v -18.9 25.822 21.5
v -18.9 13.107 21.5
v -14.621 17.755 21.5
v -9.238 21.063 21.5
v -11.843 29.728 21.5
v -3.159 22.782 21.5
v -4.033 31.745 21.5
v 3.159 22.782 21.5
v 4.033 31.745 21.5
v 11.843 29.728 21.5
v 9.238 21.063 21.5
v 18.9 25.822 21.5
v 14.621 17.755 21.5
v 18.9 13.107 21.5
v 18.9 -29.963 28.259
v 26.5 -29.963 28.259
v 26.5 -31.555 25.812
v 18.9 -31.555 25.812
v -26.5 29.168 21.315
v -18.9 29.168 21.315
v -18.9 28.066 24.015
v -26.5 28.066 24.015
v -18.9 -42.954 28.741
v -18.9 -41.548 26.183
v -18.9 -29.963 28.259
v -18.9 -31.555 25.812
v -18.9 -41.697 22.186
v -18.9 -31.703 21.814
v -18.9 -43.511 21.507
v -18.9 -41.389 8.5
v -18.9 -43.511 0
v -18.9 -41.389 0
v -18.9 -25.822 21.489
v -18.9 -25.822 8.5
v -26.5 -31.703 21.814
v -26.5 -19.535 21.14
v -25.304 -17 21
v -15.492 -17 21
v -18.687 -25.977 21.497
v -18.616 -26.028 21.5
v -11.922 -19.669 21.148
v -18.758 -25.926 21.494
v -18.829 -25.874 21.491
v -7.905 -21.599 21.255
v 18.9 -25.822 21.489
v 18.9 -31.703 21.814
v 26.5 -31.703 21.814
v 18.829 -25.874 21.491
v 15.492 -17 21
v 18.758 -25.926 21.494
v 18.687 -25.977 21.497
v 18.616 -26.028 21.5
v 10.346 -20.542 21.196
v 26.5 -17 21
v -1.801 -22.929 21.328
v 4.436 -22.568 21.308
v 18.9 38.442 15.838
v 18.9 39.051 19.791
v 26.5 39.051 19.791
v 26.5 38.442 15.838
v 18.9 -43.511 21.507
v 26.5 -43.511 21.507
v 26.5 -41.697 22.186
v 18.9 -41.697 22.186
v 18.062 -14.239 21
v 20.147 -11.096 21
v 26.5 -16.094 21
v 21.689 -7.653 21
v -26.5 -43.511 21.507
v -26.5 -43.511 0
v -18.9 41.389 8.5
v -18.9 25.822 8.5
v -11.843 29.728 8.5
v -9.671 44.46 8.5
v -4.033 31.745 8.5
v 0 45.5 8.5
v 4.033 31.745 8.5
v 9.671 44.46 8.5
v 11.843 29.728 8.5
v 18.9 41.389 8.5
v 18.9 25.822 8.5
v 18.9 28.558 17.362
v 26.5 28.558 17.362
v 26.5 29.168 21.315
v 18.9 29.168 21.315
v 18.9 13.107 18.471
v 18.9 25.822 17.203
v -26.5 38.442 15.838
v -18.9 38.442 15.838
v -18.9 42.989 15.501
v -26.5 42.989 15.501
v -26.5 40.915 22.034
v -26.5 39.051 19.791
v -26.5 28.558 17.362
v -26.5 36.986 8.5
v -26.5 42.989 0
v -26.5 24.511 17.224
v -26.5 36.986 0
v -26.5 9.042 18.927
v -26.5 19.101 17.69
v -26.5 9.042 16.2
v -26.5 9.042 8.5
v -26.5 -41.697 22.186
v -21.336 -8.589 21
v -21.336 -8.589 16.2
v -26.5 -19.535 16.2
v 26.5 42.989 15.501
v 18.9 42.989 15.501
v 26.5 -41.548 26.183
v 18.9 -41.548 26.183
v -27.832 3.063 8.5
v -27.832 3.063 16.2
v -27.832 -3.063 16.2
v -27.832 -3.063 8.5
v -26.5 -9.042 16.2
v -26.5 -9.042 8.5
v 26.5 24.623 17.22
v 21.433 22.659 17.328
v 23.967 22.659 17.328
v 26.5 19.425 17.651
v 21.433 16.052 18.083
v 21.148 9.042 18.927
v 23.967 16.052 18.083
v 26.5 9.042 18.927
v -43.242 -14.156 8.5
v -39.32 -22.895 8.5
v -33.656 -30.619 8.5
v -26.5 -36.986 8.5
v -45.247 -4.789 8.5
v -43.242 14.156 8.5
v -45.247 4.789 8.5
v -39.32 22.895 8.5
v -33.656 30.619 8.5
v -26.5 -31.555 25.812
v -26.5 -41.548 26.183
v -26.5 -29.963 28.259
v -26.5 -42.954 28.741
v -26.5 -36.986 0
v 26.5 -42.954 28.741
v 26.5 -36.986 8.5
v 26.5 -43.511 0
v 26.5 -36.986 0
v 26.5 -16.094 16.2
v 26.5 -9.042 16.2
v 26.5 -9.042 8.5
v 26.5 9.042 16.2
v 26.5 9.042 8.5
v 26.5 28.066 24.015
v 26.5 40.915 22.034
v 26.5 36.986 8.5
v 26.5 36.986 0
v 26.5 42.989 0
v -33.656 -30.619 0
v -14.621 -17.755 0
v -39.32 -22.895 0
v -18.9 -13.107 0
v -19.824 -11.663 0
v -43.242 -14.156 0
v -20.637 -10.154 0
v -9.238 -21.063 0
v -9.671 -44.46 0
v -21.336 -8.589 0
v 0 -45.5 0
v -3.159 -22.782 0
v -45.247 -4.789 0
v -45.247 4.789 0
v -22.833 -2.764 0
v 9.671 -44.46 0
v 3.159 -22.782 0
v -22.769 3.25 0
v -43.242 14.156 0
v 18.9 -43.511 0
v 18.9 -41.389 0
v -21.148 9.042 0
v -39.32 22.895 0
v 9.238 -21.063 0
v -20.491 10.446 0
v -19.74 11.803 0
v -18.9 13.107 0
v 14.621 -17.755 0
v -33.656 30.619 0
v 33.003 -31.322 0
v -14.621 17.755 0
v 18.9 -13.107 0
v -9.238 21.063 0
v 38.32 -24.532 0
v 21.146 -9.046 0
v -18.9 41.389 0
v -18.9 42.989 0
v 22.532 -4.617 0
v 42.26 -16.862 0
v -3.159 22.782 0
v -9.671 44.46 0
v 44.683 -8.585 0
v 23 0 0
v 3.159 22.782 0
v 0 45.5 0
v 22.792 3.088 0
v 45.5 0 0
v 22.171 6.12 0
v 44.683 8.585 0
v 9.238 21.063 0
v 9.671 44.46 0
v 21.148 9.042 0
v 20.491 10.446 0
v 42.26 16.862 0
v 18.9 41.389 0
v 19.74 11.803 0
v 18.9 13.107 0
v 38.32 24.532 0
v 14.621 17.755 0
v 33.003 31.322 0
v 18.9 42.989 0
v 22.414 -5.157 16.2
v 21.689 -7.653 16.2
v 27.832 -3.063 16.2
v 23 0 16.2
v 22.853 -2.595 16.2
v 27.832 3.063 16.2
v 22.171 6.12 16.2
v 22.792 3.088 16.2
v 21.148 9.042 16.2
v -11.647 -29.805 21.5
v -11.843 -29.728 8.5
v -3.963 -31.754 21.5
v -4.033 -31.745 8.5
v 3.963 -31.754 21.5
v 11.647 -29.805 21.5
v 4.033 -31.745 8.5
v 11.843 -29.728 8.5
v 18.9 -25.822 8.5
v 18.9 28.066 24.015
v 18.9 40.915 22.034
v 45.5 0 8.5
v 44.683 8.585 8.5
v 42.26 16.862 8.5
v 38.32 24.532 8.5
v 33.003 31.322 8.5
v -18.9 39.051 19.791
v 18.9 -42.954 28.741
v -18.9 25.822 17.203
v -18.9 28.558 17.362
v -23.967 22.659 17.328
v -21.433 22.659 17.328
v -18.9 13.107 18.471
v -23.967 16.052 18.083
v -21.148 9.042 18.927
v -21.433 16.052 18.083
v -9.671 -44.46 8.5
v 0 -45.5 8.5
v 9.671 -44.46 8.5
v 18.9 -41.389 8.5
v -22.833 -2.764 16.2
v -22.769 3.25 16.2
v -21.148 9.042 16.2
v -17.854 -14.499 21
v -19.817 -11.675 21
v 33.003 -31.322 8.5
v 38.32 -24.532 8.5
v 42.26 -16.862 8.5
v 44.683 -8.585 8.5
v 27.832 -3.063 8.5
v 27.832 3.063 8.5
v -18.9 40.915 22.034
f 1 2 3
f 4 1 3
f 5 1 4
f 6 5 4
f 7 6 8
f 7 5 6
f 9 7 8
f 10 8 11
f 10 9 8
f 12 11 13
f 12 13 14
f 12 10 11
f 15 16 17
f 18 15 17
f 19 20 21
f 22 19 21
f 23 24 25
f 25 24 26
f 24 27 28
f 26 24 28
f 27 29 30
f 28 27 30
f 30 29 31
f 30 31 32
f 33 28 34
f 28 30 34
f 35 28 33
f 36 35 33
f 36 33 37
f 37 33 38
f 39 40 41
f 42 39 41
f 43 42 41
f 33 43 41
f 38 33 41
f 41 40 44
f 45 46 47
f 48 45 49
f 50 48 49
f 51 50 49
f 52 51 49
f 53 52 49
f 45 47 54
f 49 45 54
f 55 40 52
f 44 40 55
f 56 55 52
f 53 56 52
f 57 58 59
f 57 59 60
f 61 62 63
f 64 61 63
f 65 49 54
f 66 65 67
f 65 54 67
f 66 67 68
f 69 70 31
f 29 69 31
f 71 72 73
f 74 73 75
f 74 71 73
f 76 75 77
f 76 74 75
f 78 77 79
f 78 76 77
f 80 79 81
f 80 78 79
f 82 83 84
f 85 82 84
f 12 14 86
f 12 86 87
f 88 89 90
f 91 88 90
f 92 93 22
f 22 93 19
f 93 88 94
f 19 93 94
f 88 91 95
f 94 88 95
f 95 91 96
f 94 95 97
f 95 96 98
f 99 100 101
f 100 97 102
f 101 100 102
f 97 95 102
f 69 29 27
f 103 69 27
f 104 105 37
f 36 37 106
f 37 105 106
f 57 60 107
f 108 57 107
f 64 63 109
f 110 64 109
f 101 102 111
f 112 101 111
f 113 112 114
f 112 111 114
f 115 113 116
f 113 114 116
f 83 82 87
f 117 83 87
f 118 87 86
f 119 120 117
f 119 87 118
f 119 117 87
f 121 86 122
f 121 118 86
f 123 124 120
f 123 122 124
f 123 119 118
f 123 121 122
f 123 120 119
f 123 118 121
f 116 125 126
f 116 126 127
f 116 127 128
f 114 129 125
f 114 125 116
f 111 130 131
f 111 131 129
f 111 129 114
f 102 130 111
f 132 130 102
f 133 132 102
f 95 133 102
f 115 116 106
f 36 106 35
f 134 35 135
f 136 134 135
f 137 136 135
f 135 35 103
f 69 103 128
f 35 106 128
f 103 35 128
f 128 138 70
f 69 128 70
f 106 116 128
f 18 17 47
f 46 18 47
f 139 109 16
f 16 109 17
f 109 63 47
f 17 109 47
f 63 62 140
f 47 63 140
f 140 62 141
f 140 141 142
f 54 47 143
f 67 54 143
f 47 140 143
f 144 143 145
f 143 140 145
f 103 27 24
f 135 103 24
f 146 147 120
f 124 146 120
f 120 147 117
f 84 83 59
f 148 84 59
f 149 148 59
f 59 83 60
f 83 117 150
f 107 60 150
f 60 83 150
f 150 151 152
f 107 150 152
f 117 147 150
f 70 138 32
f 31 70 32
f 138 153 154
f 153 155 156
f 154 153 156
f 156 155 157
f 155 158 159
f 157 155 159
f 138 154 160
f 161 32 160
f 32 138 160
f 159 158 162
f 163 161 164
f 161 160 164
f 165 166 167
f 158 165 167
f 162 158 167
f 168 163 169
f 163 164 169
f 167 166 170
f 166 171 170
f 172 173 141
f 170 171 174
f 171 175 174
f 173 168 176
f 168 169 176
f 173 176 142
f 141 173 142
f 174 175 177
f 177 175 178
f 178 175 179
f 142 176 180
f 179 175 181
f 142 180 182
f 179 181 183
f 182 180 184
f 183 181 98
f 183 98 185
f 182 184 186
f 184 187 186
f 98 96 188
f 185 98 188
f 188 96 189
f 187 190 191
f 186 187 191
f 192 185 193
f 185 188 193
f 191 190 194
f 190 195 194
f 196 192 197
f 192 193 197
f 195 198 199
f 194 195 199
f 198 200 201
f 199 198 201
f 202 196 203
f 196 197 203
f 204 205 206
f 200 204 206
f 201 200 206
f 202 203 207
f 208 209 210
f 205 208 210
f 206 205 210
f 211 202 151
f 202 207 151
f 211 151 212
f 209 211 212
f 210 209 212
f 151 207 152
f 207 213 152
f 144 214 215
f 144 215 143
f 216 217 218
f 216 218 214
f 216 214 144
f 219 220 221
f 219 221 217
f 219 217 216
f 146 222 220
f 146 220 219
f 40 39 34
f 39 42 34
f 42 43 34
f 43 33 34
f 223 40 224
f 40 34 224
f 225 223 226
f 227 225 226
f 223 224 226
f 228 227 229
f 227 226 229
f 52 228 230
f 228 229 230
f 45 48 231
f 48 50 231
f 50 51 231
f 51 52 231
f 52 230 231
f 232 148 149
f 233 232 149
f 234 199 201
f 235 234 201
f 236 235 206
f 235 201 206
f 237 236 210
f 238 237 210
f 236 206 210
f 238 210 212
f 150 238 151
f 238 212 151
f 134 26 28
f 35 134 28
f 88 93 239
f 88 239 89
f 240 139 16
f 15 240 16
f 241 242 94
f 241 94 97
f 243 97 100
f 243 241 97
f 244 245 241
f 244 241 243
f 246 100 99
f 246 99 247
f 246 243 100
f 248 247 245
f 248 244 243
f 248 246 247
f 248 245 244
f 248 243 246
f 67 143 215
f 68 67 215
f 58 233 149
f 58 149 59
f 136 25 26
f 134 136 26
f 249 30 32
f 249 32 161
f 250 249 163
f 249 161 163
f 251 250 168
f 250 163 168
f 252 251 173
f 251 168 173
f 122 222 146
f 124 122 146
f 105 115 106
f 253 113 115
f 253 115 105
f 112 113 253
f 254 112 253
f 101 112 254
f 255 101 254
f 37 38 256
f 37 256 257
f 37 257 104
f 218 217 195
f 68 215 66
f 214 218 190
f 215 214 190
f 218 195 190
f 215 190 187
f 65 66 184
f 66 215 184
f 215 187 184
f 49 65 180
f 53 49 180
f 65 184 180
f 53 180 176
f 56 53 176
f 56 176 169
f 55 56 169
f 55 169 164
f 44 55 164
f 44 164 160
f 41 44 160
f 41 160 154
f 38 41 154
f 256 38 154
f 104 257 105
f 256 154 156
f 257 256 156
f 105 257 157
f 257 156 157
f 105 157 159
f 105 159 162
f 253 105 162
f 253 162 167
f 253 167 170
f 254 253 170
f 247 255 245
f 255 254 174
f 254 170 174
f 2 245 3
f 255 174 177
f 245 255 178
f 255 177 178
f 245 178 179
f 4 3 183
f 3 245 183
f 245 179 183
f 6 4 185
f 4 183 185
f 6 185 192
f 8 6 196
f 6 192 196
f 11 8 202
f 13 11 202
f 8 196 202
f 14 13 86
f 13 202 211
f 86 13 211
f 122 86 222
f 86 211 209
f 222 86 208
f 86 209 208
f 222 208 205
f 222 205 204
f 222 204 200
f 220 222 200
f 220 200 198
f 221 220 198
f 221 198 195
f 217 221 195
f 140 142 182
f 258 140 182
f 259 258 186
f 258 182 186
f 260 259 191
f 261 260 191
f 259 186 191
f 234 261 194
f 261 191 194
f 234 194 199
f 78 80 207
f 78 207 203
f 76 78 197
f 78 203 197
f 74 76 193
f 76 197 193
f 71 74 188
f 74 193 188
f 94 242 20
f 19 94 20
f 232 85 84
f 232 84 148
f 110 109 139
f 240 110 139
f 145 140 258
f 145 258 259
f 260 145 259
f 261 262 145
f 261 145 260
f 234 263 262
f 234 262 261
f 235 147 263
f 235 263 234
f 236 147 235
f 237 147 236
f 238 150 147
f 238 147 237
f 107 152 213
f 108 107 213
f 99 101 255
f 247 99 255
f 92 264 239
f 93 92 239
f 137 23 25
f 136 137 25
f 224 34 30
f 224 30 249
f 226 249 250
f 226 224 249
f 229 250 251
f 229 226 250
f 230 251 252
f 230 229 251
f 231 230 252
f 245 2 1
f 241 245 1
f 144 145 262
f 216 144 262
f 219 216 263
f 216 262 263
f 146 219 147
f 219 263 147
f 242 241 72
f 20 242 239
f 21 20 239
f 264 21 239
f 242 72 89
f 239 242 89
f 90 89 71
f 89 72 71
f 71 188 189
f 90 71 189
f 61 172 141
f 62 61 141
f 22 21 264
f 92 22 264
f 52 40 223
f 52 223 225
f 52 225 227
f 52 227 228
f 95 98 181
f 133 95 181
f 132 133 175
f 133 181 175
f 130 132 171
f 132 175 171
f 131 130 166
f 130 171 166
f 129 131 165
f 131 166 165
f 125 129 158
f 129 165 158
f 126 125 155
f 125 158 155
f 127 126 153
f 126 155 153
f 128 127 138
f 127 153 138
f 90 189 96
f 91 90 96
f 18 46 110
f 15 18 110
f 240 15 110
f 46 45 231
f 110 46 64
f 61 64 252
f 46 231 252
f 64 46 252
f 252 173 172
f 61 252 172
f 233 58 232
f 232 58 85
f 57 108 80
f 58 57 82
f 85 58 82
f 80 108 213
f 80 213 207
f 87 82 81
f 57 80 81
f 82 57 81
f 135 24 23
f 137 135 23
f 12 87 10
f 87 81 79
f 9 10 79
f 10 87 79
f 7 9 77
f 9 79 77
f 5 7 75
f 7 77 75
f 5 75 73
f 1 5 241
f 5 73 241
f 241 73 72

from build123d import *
from build123d import SkipClean  # not in build123d's __all__

# Parameters (mm, degrees)
F2_DEPTH = 8.5
F3_DEPTH = 29
F4_DEPTH = 16.2
F5_DEPTH = 21.5
F6_W     = 8.4938306999
F6_H     = 8
F7_DEPTH = 53
F8_DEPTH = 7.6
F9_START = -45.4
F9_DEPTH = 9.2


with BuildPart() as f2:
    # F0 (on Top) → F2 (new body)
    with BuildSketch(Plane.XY):
        with BuildLine():
            ThreePointArc((-26.5, -9.04157066), (-28, 0), (-26.5, 9.04157066))
            Line((-26.5, 9.04157066), (-26.5, 36.9864840178))
            ThreePointArc((-26.5, 36.9864840178), (-45.5, 0), (-26.5, -36.9864840178))
            Line((-26.5, -36.9864840178), (-26.5, -19.535109446))
            Line((-26.5, -19.535109446), (-26.5, -9.04157066))
        make_face()
        with BuildLine():
            Line((18.9, -41.3888873975), (18.9, -25.822277204))
            ThreePointArc((18.9, -25.822277204), (0, -32), (-18.9, -25.822277204))
            Line((-18.9, -25.822277204), (-18.9, -41.3888873975))
            ThreePointArc((-18.9, -41.3888873975), (0, -45.5), (18.9, -41.3888873975))
        make_face()
        with BuildLine():
            Line((26.5, 36.9864840178), (26.5, 9.04157066))
            ThreePointArc((26.5, 9.04157066), (28, 0), (26.5, -9.04157066))
            Line((26.5, -9.04157066), (26.5, -16.0938306999))
            Line((26.5, -16.0938306999), (26.5, -36.9864840178))
            ThreePointArc((26.5, -36.9864840178), (40.4722126897, -20.7906228863), (45.5, 0))
            ThreePointArc((45.5, 0), (40.4722126897, 20.7906228863), (26.5, 36.9864840178))
        make_face()
        with BuildLine():
            ThreePointArc((-18.9, 25.822277204), (0, 32), (18.9, 25.822277204))
            Line((18.9, 25.822277204), (18.9, 41.3888873975))
            ThreePointArc((18.9, 41.3888873975), (0, 45.5), (-18.9, 41.3888873975))
            Line((-18.9, 41.3888873975), (-18.9, 25.822277204))
        make_face()
        with BuildLine():
            Line((-18.9, -25.822277204), (-18.9, -13.1068684284))
            ThreePointArc((-18.9, -13.1068684284), (-20.2445385279, -10.915981852), (-21.3362014212, -8.588743151))
            Line((-21.3362014212, -8.588743151), (-26.5, -19.535109446))
            Line((-26.5, -19.535109446), (-26.5, -36.9864840178))
            ThreePointArc((-26.5, -36.9864840178), (-22.806474714, -39.3714961758), (-18.9, -41.3888873975))
            Line((-18.9, -41.3888873975), (-18.9, -25.822277204))
        make_face()
        with BuildLine():
            Line((18.9, -25.822277204), (18.9, -13.1068684284))
            ThreePointArc((18.9, -13.1068684284), (0, -23), (-18.9, -13.1068684284))
            Line((-18.9, -13.1068684284), (-18.9, -25.822277204))
            ThreePointArc((-18.9, -25.822277204), (0, -32), (18.9, -25.822277204))
        make_face()
        with BuildLine():
            Line((26.5, -16.0938306999), (21.6892735119, -7.6534576843))
            ThreePointArc((21.6892735119, -7.6534576843), (20.4769920458, -10.4734329022), (18.9, -13.1068684284))
            Line((18.9, -13.1068684284), (18.9, -25.822277204))
            Line((18.9, -25.822277204), (18.9, -41.3888873975))
            ThreePointArc((18.9, -41.3888873975), (22.806474714, -39.3714961758), (26.5, -36.9864840178))
            Line((26.5, -36.9864840178), (26.5, -16.0938306999))
        make_face()
        with BuildLine():
            ThreePointArc((21.1482859826, 9.04157066), (22.5323165431, 4.614619291), (23, 0))
            ThreePointArc((23, 0), (22.6699502731, -3.8824418364), (21.6892735119, -7.6534576843))
            Line((21.6892735119, -7.6534576843), (26.5, -16.0938306999))
            Line((26.5, -16.0938306999), (26.5, -9.04157066))
            ThreePointArc((26.5, -9.04157066), (28, 0), (26.5, 9.04157066))
            Line((26.5, 9.04157066), (21.1482859826, 9.04157066))
        make_face()
        with BuildLine():
            ThreePointArc((18.9, 13.1068684284), (20.127045586, 11.1311291421), (21.1482859826, 9.04157066))
            Line((21.1482859826, 9.04157066), (26.5, 9.04157066))
            Line((26.5, 9.04157066), (26.5, 36.9864840178))
            ThreePointArc((26.5, 36.9864840178), (22.806474714, 39.3714961758), (18.9, 41.3888873975))
            Line((18.9, 41.3888873975), (18.9, 25.822277204))
            Line((18.9, 25.822277204), (18.9, 13.1068684284))
        make_face()
        with BuildLine():
            ThreePointArc((-18.9, 13.1068684284), (0, 23), (18.9, 13.1068684284))
            Line((18.9, 13.1068684284), (18.9, 25.822277204))
            ThreePointArc((18.9, 25.822277204), (0, 32), (-18.9, 25.822277204))
            Line((-18.9, 25.822277204), (-18.9, 13.1068684284))
        make_face()
        with BuildLine():
            ThreePointArc((-21.1482859826, 9.04157066), (-20.127045586, 11.1311291421), (-18.9, 13.1068684284))
            Line((-18.9, 13.1068684284), (-18.9, 25.822277204))
            Line((-18.9, 25.822277204), (-18.9, 41.3888873975))
            ThreePointArc((-18.9, 41.3888873975), (-22.806474714, 39.3714961758), (-26.5, 36.9864840178))
            Line((-26.5, 36.9864840178), (-26.5, 9.04157066))
            Line((-26.5, 9.04157066), (-21.1482859826, 9.04157066))
        make_face()
        with BuildLine():
            ThreePointArc((-21.3362014212, -8.588743151), (-22.9986936316, 0.245135149), (-21.1482859826, 9.04157066))
            Line((-21.1482859826, 9.04157066), (-26.5, 9.04157066))
            ThreePointArc((-26.5, 9.04157066), (-28, 0), (-26.5, -9.04157066))
            Line((-26.5, -9.04157066), (-26.5, -19.535109446))
            Line((-26.5, -19.535109446), (-21.3362014212, -8.588743151))
        make_face()
        with BuildLine():
            ThreePointArc((-26.5, 36.9864840178), (-22.806474714, 39.3714961758), (-18.9, 41.3888873975))
            Line((-18.9, 41.3888873975), (-18.9, 42.9887993038))
            Line((-18.9, 42.9887993038), (-26.5, 42.9887993038))
            Line((-26.5, 42.9887993038), (-26.5, 36.9864840178))
        make_face()
        with BuildLine():
            ThreePointArc((18.9, 41.3888873975), (22.806474714, 39.3714961758), (26.5, 36.9864840178))
            Line((26.5, 36.9864840178), (26.5, 42.9887993038))
            Line((26.5, 42.9887993038), (18.9, 42.9887993038))
            Line((18.9, 42.9887993038), (18.9, 41.3888873975))
        make_face()
        with BuildLine():
            Line((26.5, -43.5112006962), (26.5, -36.9864840178))
            ThreePointArc((26.5, -36.9864840178), (22.806474714, -39.3714961758), (18.9, -41.3888873975))
            Line((18.9, -41.3888873975), (18.9, -43.5112006962))
            Line((18.9, -43.5112006962), (26.5, -43.5112006962))
        make_face()
        with BuildLine():
            Line((-18.9, -43.5112006962), (-18.9, -41.3888873975))
            ThreePointArc((-18.9, -41.3888873975), (-22.806474714, -39.3714961758), (-26.5, -36.9864840178))
            Line((-26.5, -36.9864840178), (-26.5, -43.5112006962))
            Line((-26.5, -43.5112006962), (-18.9, -43.5112006962))
        make_face()
    extrude(amount=F2_DEPTH)

    # F0 (on Top) → F3 (join)
    with BuildSketch(Plane.XY):
        with BuildLine():
            Line((-18.9, -25.822277204), (-18.9, -13.1068684284))
            ThreePointArc((-18.9, -13.1068684284), (-20.2445385279, -10.915981852), (-21.3362014212, -8.588743151))
            Line((-21.3362014212, -8.588743151), (-26.5, -19.535109446))
            Line((-26.5, -19.535109446), (-26.5, -36.9864840178))
            ThreePointArc((-26.5, -36.9864840178), (-22.806474714, -39.3714961758), (-18.9, -41.3888873975))
            Line((-18.9, -41.3888873975), (-18.9, -25.822277204))
        make_face()
        with BuildLine():
            ThreePointArc((-21.1482859826, 9.04157066), (-20.127045586, 11.1311291421), (-18.9, 13.1068684284))
            Line((-18.9, 13.1068684284), (-18.9, 25.822277204))
            Line((-18.9, 25.822277204), (-18.9, 41.3888873975))
            ThreePointArc((-18.9, 41.3888873975), (-22.806474714, 39.3714961758), (-26.5, 36.9864840178))
            Line((-26.5, 36.9864840178), (-26.5, 9.04157066))
            Line((-26.5, 9.04157066), (-21.1482859826, 9.04157066))
        make_face()
        with BuildLine():
            ThreePointArc((18.9, 13.1068684284), (20.127045586, 11.1311291421), (21.1482859826, 9.04157066))
            Line((21.1482859826, 9.04157066), (26.5, 9.04157066))
            Line((26.5, 9.04157066), (26.5, 36.9864840178))
            ThreePointArc((26.5, 36.9864840178), (22.806474714, 39.3714961758), (18.9, 41.3888873975))
            Line((18.9, 41.3888873975), (18.9, 25.822277204))
            Line((18.9, 25.822277204), (18.9, 13.1068684284))
        make_face()
        with BuildLine():
            Line((26.5, -16.0938306999), (21.6892735119, -7.6534576843))
            ThreePointArc((21.6892735119, -7.6534576843), (20.4769920458, -10.4734329022), (18.9, -13.1068684284))
            Line((18.9, -13.1068684284), (18.9, -25.822277204))
            Line((18.9, -25.822277204), (18.9, -41.3888873975))
            ThreePointArc((18.9, -41.3888873975), (22.806474714, -39.3714961758), (26.5, -36.9864840178))
            Line((26.5, -36.9864840178), (26.5, -16.0938306999))
        make_face()
        with BuildLine():
            Line((-18.9, -43.5112006962), (-18.9, -41.3888873975))
            ThreePointArc((-18.9, -41.3888873975), (-22.806474714, -39.3714961758), (-26.5, -36.9864840178))
            Line((-26.5, -36.9864840178), (-26.5, -43.5112006962))
            Line((-26.5, -43.5112006962), (-18.9, -43.5112006962))
        make_face()
        with BuildLine():
            Line((26.5, -43.5112006962), (26.5, -36.9864840178))
            ThreePointArc((26.5, -36.9864840178), (22.806474714, -39.3714961758), (18.9, -41.3888873975))
            Line((18.9, -41.3888873975), (18.9, -43.5112006962))
            Line((18.9, -43.5112006962), (26.5, -43.5112006962))
        make_face()
        with BuildLine():
            ThreePointArc((18.9, 41.3888873975), (22.806474714, 39.3714961758), (26.5, 36.9864840178))
            Line((26.5, 36.9864840178), (26.5, 42.9887993038))
            Line((26.5, 42.9887993038), (18.9, 42.9887993038))
            Line((18.9, 42.9887993038), (18.9, 41.3888873975))
        make_face()
        with BuildLine():
            ThreePointArc((-26.5, 36.9864840178), (-22.806474714, 39.3714961758), (-18.9, 41.3888873975))
            Line((-18.9, 41.3888873975), (-18.9, 42.9887993038))
            Line((-18.9, 42.9887993038), (-26.5, 42.9887993038))
            Line((-26.5, 42.9887993038), (-26.5, 36.9864840178))
        make_face()
    with SkipClean():  # cleaning this boolean's faces spoils the solid; the shape is the same uncleaned
        extrude(amount=F3_DEPTH)

    # F0 (on Top) → F4 (join)
    with BuildSketch(Plane.XY):
        with BuildLine():
            ThreePointArc((-21.3362014212, -8.588743151), (-22.9986936316, 0.245135149), (-21.1482859826, 9.04157066))
            Line((-21.1482859826, 9.04157066), (-26.5, 9.04157066))
            ThreePointArc((-26.5, 9.04157066), (-28, 0), (-26.5, -9.04157066))
            Line((-26.5, -9.04157066), (-26.5, -19.535109446))
            Line((-26.5, -19.535109446), (-21.3362014212, -8.588743151))
        make_face()
        with BuildLine():
            ThreePointArc((21.1482859826, 9.04157066), (22.5323165431, 4.614619291), (23, 0))
            ThreePointArc((23, 0), (22.6699502731, -3.8824418364), (21.6892735119, -7.6534576843))
            Line((21.6892735119, -7.6534576843), (26.5, -16.0938306999))
            Line((26.5, -16.0938306999), (26.5, -9.04157066))
            ThreePointArc((26.5, -9.04157066), (28, 0), (26.5, 9.04157066))
            Line((26.5, 9.04157066), (21.1482859826, 9.04157066))
        make_face()
    extrude(amount=F4_DEPTH)

    # F0 (on Top) → F5 (join)
    with BuildSketch(Plane.XY):
        with BuildLine():
            ThreePointArc((-18.9, 13.1068684284), (0, 23), (18.9, 13.1068684284))
            Line((18.9, 13.1068684284), (18.9, 25.822277204))
            ThreePointArc((18.9, 25.822277204), (0, 32), (-18.9, 25.822277204))
            Line((-18.9, 25.822277204), (-18.9, 13.1068684284))
        make_face()
        with BuildLine():
            Line((18.9, -25.822277204), (18.9, -13.1068684284))
            ThreePointArc((18.9, -13.1068684284), (0, -23), (-18.9, -13.1068684284))
            Line((-18.9, -13.1068684284), (-18.9, -25.822277204))
            ThreePointArc((-18.9, -25.822277204), (0, -32), (18.9, -25.822277204))
        make_face()
    extrude(amount=F5_DEPTH)

    # F6 (on face) → F7 (cut)
    with BuildSketch(Plane.YZ.offset(26.5)):
        Polygon((-31.7034486039, 21.8143278533), (-17, 21), (-16.0938306999, 21), (-16.0938306999, 29), (-43.5112006962, 29), (-43.5112006962, 21.5072025748), (-41.6965513961, 22.1856721467), (-41.5480136787, 26.1829132636), (-42.9539764288, 28.7413737907), (-29.9629427989, 28.2586262093), (-31.5549108865, 25.8115689702), align=None)
        with Locations((-11.8469153499, 25)):
            Rectangle(F6_W, F6_H)
    extrude(amount=-F7_DEPTH, mode=Mode.SUBTRACT)

    # F6 (on face) → F8 (cut, through all)
    with BuildSketch(Plane.YZ.offset(26.5)):
        with BuildLine():
            Line((38.4415975598, 15.8380199759), (43, 15.5))
            Line((43, 15.5), (43, 29))
            Line((43, 29), (8.2, 29))
            Line((8.2, 29), (8.2, 19))
            add(Edge.make_bspline(
                [(28.5584024402, 17.3619800241), (22.9, 16.6746068906), (15.6, 18.3999594301), (8.2, 19)],
                knots=[0, 0, 0, 0, 20.4241929916, 20.4241929916, 20.4241929916, 20.4241929916], degree=3))
            Line((28.5584024402, 17.3619800241), (29.1679864595, 21.3152580719))
            Line((29.1679864595, 21.3152580719), (28.0664972036, 24.014650859))
            Line((28.0664972036, 24.014650859), (40.914650859, 22.0335027964))
            Line((40.914650859, 22.0335027964), (39.051181579, 19.7912980238))
            Line((39.051181579, 19.7912980238), (38.4415975598, 15.8380199759))
        make_face()
    extrude(amount=-F8_DEPTH, mode=Mode.SUBTRACT)

    # F6 (on face) → F9 (cut)
    with BuildSketch(Plane.YZ.offset(26.5).offset(F9_START)):
        with BuildLine():
            Line((38.4415975598, 15.8380199759), (43, 15.5))
            Line((43, 15.5), (43, 29))
            Line((43, 29), (8.2, 29))
            Line((8.2, 29), (8.2, 19))
            add(Edge.make_bspline(
                [(28.5584024402, 17.3619800241), (22.9, 16.6746068906), (15.6, 18.3999594301), (8.2, 19)],
                knots=[0, 0, 0, 0, 20.4241929916, 20.4241929916, 20.4241929916, 20.4241929916], degree=3))
            Line((28.5584024402, 17.3619800241), (29.1679864595, 21.3152580719))
            Line((29.1679864595, 21.3152580719), (28.0664972036, 24.014650859))
            Line((28.0664972036, 24.014650859), (40.914650859, 22.0335027964))
            Line((40.914650859, 22.0335027964), (39.051181579, 19.7912980238))
            Line((39.051181579, 19.7912980238), (38.4415975598, 15.8380199759))
        make_face()
    extrude(amount=-F9_DEPTH, mode=Mode.SUBTRACT)


solid = f2.part
